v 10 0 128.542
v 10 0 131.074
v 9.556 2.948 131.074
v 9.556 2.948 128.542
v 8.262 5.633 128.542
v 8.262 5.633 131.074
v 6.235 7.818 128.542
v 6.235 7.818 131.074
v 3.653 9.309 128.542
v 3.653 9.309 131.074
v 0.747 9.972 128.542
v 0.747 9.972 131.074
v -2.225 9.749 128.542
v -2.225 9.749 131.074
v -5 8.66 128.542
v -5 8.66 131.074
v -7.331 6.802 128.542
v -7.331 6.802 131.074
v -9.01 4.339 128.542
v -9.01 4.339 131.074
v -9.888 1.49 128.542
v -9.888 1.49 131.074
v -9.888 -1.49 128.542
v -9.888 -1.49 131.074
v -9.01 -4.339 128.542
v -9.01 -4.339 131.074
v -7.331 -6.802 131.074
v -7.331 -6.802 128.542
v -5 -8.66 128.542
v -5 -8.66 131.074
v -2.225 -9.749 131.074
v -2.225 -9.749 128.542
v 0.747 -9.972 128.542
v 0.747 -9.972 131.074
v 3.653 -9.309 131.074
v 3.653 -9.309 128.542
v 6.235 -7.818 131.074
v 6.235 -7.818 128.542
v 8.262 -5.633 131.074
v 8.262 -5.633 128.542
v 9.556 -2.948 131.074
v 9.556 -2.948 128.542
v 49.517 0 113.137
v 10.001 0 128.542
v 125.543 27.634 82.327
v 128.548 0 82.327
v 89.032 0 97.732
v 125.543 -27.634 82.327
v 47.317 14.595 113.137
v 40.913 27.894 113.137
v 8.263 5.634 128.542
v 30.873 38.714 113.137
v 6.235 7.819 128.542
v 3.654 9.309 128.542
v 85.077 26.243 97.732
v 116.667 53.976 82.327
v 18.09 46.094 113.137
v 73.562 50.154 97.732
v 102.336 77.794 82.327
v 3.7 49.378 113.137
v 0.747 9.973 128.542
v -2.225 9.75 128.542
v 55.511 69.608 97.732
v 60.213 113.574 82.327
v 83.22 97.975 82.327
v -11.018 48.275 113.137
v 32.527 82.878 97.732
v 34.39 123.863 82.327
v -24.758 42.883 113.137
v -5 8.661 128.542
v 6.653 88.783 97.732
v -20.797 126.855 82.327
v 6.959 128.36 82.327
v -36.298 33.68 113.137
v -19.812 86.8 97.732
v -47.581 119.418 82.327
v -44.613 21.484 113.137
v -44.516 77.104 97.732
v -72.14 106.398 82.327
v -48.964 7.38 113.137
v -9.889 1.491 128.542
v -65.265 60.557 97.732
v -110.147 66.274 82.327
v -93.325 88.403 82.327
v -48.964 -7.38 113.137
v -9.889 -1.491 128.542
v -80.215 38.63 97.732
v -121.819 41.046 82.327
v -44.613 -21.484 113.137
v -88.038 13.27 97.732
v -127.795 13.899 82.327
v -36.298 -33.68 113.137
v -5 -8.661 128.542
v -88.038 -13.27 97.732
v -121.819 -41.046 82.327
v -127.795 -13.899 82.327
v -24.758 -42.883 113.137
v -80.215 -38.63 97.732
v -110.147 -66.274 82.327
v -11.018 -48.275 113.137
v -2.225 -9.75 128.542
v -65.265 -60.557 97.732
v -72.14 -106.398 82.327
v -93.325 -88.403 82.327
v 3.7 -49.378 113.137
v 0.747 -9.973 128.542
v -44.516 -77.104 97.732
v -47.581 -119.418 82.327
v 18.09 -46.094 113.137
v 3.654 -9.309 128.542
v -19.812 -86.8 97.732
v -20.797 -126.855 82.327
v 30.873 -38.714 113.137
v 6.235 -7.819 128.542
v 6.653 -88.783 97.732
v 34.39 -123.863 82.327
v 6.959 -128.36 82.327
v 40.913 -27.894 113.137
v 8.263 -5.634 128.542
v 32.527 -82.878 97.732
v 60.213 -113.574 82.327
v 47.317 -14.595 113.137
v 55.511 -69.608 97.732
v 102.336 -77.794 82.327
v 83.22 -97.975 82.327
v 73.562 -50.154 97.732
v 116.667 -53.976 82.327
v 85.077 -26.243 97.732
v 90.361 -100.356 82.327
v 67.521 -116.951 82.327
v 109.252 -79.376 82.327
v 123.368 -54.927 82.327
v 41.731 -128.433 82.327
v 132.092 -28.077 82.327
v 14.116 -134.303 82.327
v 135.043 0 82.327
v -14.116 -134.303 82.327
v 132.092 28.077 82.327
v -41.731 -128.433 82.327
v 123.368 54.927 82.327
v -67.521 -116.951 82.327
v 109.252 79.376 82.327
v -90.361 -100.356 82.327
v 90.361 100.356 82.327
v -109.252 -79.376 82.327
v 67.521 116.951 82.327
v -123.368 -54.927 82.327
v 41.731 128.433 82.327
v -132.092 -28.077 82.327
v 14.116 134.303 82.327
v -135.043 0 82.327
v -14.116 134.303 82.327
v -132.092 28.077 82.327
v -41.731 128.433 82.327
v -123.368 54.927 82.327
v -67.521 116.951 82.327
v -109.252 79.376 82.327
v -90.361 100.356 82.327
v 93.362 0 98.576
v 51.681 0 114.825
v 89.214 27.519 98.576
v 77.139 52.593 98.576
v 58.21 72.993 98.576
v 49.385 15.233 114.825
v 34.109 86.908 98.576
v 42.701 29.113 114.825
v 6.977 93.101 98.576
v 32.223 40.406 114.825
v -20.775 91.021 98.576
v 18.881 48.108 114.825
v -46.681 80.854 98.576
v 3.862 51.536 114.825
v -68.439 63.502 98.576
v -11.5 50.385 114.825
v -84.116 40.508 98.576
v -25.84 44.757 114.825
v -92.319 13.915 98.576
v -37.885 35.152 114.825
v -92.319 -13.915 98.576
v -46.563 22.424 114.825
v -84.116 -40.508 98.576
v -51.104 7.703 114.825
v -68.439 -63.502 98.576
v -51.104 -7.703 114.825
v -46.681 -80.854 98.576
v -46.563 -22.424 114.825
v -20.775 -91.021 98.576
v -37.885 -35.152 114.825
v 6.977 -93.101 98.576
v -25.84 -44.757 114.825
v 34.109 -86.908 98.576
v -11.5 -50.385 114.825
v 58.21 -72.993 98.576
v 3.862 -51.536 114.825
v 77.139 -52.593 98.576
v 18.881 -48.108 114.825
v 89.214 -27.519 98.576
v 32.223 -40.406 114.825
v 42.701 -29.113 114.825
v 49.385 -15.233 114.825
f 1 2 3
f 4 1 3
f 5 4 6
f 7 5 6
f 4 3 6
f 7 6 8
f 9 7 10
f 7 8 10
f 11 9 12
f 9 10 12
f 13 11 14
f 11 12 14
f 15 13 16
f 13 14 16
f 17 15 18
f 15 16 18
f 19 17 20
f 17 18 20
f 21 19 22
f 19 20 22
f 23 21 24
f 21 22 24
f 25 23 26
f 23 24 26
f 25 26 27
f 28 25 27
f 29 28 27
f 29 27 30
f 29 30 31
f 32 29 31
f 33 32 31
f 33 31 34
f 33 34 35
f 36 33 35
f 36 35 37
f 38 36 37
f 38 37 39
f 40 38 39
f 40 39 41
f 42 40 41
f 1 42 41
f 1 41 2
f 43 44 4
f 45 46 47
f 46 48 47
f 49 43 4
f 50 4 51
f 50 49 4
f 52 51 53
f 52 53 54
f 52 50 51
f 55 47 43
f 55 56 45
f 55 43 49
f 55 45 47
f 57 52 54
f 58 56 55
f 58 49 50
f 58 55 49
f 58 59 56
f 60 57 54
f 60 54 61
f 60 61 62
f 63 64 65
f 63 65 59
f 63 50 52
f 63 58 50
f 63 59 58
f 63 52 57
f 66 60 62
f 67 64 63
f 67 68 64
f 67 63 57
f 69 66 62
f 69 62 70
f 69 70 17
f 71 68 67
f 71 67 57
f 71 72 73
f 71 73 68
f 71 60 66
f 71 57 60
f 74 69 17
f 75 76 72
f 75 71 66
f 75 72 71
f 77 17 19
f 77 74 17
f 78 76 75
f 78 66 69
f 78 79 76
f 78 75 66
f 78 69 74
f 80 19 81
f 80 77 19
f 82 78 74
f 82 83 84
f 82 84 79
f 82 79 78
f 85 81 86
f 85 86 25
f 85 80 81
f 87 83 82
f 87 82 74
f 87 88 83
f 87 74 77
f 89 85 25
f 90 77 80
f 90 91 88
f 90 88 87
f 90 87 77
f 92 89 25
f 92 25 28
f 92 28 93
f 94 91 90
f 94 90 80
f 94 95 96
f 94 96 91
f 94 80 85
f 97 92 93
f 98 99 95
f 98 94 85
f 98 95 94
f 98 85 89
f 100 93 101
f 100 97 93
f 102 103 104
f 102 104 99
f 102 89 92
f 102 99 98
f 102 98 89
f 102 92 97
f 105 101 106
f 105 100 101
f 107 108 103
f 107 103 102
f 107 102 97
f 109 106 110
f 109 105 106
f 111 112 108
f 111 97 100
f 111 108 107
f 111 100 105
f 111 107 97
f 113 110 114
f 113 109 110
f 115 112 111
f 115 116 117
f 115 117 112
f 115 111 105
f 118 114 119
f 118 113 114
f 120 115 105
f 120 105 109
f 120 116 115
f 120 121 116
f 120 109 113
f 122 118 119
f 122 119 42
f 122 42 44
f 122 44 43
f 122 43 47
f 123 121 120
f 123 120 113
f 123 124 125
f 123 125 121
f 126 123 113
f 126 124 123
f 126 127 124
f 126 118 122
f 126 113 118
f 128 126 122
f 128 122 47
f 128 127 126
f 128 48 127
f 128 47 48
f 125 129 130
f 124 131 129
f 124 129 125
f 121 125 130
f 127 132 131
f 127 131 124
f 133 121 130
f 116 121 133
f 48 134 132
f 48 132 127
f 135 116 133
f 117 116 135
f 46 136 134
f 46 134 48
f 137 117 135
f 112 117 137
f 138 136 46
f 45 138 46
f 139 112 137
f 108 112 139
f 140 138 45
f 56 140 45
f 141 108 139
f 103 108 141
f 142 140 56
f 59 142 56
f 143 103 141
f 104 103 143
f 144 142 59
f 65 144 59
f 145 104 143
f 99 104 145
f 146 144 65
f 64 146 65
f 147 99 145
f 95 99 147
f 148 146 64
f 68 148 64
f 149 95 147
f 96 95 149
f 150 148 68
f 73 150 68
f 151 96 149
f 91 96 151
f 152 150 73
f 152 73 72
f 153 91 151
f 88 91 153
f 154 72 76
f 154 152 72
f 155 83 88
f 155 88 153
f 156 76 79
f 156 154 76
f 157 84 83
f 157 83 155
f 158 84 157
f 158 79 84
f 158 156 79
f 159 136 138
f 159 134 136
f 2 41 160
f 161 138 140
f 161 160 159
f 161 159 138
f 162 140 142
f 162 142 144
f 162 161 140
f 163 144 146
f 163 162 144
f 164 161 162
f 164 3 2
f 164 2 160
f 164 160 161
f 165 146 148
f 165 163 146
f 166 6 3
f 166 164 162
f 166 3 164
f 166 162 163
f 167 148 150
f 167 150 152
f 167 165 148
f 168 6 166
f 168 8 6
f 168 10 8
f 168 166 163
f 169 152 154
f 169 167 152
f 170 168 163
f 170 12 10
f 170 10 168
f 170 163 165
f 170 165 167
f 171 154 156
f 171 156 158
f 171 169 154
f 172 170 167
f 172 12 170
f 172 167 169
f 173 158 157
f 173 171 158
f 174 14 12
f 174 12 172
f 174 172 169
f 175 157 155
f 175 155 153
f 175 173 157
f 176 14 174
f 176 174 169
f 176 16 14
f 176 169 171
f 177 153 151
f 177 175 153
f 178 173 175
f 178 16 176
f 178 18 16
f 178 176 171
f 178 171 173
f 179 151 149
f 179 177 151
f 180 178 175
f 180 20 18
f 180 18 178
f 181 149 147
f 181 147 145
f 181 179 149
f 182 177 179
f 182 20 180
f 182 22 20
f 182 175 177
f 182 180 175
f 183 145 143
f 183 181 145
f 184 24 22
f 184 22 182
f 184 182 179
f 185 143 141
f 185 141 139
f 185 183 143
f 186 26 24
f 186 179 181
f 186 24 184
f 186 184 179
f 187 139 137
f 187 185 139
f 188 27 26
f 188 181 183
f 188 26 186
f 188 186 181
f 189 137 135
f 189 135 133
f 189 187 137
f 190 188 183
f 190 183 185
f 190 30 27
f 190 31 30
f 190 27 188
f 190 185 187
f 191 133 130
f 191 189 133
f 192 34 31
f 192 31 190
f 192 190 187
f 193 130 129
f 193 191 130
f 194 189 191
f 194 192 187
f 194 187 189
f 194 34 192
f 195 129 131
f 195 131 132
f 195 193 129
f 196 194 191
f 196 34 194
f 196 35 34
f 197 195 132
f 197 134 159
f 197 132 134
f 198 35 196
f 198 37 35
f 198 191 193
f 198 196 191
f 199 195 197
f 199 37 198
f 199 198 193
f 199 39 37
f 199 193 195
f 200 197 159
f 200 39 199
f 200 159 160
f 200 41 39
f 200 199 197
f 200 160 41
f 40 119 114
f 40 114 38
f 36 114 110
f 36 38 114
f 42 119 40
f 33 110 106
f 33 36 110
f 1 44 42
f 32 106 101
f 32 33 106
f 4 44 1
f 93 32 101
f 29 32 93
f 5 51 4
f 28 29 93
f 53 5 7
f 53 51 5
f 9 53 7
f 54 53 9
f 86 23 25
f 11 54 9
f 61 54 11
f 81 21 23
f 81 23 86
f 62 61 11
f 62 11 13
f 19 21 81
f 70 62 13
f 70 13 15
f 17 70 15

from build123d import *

# Parameters (mm, degrees)
F2_DEPTH = 25.4
F3_DEPTH = 9.398


with BuildPart() as f1:
    # F0 (on Front) → F1 (revolve)
    with BuildSketch(Plane.XZ):
        Polygon((11.2185701728, 72.9290992022), (159.1500639915, 72.9290992022), (10, 131.0742050409), (0, 131.0742050409), (0, 128.5420060158), (10.000754334, 128.5420060158), (135.111038288, 79.7686397339), (11.2185701728, 79.6332210302), align=None)
    revolve(axis=Axis((0, 0, 129.8081055284), (0, 0, 1)))

    # F2 (cut): a face of the model
    f2_faces = [f1.faces().sort_by_distance(p)[0] for p in [
        (0, 0, 131.0742050409),
    ]]
    extrude(f2_faces, amount=-F2_DEPTH, mode=Mode.SUBTRACT)

    # F3 (cut): a face of the model
    f3_faces = [f1.faces().sort_by_distance(p)[0] for p in [
        (-15.7200137518, 0, 72.9290992022),
    ]]
    extrude(f3_faces, amount=-F3_DEPTH, mode=Mode.SUBTRACT)


solid = f1.part
